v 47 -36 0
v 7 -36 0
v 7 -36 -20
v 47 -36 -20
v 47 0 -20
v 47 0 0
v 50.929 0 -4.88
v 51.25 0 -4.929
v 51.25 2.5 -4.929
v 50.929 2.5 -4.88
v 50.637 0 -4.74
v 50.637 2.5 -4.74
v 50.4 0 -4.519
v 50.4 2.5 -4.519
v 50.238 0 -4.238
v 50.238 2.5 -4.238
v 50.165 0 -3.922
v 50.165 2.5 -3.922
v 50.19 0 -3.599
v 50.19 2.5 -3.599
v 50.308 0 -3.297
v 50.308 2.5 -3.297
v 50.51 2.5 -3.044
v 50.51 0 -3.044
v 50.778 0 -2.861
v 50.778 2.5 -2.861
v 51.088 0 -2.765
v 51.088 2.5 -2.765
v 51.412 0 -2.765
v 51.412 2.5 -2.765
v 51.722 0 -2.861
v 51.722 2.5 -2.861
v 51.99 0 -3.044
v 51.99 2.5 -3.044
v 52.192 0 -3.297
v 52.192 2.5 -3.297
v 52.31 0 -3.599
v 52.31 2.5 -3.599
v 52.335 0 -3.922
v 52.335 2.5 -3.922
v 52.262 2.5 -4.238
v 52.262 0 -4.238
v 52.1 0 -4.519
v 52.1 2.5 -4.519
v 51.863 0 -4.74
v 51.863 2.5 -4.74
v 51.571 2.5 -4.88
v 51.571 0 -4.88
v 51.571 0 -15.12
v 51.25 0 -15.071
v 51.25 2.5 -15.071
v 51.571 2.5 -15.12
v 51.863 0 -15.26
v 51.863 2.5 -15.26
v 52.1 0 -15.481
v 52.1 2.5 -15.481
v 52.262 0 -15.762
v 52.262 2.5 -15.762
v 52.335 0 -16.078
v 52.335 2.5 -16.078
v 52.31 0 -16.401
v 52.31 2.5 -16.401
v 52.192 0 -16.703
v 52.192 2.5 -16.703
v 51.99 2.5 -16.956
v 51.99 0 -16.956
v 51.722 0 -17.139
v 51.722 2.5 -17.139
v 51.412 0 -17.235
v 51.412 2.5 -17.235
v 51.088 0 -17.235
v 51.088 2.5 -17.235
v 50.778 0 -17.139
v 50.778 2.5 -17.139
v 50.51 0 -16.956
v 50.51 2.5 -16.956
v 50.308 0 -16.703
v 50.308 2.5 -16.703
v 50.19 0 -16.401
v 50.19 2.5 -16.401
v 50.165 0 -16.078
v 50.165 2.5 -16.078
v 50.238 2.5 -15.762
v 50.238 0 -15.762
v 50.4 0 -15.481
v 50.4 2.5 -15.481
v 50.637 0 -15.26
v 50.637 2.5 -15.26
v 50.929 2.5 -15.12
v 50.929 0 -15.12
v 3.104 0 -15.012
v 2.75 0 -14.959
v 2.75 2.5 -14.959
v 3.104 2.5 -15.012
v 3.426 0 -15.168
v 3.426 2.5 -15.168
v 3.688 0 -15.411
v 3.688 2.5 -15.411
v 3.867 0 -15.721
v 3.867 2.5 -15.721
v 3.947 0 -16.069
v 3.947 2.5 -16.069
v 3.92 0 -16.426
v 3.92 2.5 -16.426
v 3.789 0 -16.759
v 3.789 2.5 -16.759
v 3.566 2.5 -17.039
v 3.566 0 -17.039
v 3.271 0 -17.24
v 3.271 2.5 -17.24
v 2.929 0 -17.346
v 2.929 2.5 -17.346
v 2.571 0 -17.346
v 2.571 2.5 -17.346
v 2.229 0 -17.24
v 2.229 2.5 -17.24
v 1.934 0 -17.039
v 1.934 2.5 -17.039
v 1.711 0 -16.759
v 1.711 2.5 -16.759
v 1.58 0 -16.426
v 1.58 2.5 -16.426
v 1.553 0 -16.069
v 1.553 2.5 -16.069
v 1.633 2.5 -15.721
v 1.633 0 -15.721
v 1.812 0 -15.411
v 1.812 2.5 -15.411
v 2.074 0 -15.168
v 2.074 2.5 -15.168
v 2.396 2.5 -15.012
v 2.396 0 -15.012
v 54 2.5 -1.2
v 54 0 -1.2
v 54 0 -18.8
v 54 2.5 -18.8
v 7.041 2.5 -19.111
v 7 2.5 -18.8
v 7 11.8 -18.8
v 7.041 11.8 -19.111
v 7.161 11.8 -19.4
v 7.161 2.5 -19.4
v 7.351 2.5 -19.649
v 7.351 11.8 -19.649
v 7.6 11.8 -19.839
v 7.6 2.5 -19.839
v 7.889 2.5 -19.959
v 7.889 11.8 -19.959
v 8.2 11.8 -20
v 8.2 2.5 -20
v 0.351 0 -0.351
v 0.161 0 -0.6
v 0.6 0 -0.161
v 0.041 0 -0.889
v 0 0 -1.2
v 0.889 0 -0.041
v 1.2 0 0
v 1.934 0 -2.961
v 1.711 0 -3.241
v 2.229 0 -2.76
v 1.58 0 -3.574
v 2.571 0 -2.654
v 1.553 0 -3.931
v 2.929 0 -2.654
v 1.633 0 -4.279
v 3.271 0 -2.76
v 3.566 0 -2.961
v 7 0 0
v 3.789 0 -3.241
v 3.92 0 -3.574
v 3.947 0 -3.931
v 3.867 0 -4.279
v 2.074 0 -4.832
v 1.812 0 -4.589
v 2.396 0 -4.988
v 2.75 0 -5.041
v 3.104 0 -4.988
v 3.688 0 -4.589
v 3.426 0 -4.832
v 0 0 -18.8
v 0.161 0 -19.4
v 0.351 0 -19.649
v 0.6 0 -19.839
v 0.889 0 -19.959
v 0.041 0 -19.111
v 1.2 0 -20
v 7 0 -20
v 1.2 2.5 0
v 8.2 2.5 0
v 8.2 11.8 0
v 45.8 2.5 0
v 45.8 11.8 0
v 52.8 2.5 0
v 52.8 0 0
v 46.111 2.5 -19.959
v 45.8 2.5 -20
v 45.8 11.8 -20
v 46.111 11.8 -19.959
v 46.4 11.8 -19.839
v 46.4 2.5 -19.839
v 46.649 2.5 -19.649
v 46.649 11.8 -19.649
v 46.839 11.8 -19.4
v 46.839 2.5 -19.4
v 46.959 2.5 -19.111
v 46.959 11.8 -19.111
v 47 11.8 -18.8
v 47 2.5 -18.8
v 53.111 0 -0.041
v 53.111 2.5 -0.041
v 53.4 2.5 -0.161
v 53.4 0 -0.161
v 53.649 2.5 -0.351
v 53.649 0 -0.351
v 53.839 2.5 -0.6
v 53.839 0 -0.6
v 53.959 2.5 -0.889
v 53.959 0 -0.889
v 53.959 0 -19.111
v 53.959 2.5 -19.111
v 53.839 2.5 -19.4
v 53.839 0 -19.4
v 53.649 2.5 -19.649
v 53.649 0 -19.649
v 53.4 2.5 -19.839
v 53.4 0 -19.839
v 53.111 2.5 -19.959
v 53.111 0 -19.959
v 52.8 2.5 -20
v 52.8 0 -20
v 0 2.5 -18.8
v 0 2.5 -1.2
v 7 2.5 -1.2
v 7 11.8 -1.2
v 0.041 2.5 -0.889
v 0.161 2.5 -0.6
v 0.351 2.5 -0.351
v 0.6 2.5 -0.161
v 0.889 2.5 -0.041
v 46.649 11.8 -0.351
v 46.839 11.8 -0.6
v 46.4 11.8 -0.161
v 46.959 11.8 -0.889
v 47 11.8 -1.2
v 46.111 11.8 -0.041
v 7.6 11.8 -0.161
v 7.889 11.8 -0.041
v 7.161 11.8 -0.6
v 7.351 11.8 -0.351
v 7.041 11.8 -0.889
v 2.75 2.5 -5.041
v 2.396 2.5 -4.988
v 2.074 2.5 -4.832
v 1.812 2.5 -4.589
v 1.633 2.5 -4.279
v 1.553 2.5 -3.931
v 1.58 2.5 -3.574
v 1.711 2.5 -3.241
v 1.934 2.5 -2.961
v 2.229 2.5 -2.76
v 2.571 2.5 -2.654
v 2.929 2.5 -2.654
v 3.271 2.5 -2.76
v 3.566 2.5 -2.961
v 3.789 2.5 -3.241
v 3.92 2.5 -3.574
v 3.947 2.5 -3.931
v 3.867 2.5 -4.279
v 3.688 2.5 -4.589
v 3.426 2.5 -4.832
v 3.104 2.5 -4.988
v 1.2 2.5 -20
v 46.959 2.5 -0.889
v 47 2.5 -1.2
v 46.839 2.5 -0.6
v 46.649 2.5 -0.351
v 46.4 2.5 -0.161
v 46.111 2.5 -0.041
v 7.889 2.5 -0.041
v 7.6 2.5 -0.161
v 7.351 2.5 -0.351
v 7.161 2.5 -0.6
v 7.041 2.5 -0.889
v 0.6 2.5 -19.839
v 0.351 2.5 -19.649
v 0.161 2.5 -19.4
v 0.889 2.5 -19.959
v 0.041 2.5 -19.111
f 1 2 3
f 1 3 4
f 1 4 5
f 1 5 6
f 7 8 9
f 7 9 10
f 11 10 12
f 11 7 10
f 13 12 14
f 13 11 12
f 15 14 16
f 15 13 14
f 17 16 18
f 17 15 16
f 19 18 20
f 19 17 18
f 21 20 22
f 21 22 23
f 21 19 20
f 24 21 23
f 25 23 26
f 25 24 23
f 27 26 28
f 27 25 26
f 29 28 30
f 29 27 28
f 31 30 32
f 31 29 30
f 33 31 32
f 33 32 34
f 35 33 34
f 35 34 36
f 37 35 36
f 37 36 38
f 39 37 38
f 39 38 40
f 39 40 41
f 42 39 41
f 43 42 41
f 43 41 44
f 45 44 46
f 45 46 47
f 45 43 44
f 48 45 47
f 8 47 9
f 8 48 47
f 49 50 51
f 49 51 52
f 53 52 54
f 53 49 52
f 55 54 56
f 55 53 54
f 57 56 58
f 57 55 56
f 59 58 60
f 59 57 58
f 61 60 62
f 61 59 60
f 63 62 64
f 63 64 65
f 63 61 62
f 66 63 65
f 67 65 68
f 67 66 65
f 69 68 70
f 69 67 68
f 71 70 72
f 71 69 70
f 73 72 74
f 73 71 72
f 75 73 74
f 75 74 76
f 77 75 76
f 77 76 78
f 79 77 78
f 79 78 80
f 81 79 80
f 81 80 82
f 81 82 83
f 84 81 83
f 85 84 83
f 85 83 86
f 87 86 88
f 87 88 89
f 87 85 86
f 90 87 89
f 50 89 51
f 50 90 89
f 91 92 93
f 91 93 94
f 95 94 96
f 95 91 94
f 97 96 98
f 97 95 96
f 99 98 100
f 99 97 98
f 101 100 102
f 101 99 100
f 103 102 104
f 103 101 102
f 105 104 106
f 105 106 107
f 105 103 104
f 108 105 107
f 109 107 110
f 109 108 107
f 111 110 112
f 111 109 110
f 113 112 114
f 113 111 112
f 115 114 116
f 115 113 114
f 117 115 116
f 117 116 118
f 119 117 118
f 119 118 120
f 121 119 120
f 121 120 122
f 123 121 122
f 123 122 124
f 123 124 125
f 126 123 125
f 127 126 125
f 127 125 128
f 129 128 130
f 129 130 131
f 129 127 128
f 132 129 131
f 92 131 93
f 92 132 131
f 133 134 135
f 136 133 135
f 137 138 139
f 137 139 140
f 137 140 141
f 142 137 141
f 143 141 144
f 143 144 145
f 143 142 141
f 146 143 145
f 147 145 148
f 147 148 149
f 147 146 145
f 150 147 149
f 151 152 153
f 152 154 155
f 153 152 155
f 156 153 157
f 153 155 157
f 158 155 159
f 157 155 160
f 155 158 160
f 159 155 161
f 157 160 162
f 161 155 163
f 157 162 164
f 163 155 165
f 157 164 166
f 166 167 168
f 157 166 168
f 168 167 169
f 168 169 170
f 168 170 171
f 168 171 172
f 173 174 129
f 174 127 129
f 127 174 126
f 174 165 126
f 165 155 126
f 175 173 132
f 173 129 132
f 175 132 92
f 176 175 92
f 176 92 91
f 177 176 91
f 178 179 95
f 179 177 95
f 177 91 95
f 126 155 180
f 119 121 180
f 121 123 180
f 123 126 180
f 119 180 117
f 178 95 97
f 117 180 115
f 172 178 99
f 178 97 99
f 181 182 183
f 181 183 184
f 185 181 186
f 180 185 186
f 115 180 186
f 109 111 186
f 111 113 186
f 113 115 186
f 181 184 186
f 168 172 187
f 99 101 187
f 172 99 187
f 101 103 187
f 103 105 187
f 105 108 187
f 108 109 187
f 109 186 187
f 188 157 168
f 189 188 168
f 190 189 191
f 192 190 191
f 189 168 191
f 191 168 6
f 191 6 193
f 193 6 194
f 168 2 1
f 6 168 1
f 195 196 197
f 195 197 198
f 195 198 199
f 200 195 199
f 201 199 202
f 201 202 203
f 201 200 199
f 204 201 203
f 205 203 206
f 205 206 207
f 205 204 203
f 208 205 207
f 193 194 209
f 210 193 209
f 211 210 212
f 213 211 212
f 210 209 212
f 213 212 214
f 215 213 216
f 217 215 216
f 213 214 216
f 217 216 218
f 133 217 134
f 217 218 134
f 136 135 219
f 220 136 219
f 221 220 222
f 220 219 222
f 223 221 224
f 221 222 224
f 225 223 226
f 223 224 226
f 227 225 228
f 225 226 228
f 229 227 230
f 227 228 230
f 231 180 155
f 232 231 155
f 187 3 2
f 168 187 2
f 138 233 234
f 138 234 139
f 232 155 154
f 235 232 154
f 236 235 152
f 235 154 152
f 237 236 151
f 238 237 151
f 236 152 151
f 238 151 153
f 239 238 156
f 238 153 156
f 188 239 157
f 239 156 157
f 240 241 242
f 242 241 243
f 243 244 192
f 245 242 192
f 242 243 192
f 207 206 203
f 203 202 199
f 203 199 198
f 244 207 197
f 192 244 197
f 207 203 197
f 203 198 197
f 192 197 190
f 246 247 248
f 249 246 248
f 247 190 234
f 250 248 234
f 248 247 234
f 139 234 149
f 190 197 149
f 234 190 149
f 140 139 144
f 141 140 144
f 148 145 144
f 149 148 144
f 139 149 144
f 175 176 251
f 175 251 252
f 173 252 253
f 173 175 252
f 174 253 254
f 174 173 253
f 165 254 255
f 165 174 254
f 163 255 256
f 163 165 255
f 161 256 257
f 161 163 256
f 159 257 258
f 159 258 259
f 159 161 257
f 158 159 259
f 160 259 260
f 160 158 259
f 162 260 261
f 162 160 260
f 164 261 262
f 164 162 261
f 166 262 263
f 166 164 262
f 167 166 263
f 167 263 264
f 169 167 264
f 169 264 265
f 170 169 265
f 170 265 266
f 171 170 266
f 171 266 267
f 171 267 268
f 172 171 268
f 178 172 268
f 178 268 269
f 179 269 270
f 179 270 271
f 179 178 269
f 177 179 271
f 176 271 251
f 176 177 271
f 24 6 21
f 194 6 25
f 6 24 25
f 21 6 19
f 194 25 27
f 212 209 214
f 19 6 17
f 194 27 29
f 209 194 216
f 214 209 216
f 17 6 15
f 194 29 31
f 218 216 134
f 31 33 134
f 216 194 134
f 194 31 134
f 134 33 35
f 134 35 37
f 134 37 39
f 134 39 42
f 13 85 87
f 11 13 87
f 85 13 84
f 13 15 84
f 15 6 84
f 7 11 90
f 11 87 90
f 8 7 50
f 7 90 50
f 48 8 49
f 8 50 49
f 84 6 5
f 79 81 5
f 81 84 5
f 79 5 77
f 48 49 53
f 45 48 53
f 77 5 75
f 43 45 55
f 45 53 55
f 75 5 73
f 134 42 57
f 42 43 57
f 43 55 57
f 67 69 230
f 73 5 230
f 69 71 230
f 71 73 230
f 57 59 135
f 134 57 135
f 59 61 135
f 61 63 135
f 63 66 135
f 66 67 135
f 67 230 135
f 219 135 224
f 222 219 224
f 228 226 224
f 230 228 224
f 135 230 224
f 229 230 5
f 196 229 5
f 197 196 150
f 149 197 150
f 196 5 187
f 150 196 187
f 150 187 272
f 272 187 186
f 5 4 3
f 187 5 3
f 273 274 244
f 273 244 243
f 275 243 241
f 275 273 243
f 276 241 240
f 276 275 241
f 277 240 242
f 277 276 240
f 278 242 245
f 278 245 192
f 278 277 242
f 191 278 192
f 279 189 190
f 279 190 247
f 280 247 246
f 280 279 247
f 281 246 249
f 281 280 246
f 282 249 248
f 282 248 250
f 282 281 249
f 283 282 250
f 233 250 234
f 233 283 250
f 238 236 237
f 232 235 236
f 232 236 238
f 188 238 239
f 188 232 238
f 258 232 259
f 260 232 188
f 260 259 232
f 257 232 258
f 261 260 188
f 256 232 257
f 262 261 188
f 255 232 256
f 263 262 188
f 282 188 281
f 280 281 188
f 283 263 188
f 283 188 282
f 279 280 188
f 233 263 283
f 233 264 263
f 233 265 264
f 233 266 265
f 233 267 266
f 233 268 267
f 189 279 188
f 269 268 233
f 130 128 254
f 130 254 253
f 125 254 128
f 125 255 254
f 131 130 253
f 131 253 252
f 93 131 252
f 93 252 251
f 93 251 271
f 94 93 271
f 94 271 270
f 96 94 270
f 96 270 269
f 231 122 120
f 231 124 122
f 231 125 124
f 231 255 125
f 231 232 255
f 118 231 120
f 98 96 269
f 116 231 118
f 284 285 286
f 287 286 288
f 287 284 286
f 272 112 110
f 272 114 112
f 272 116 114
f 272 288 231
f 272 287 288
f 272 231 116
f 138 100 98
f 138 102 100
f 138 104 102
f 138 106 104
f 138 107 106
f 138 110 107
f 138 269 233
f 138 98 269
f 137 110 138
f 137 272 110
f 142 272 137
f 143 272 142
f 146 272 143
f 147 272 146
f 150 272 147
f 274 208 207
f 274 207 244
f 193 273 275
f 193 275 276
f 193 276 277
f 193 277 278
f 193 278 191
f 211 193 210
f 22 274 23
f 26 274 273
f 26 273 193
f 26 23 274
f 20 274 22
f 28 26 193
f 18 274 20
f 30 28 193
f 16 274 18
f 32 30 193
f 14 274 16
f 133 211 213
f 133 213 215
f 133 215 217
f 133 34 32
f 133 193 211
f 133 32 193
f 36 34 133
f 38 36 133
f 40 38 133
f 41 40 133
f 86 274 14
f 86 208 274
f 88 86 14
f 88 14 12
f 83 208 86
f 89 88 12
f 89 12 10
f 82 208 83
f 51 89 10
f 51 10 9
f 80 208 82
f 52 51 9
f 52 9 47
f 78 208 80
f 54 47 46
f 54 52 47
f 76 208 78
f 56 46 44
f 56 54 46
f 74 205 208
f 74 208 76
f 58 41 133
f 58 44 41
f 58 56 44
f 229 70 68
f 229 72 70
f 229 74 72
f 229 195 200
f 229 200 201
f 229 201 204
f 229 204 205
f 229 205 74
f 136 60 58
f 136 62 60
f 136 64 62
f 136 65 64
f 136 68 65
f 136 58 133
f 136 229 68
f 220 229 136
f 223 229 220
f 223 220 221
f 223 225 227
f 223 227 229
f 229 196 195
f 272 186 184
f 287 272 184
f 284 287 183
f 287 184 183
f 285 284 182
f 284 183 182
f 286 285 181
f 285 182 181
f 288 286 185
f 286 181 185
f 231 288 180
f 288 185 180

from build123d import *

# Parameters (mm, degrees)
SKETCH1_R           = 1.200027231
SKETCH1_R_2         = 1.087684018
BOSS_EXTRUDE1_DEPTH = 2.5
BOSS_EXTRUDE2_DEPTH = 9.3
SKETCH3_W           = 40
SKETCH3_H           = 20
BOSS_EXTRUDE3_DEPTH = 36


with BuildPart() as part:
    # Sketch1 → Boss-Extrude1 (new body)
    with BuildSketch(Plane(origin=(0, 0, 0), x_dir=(1, 0, 0), z_dir=(0, 1, 0))):
        with BuildLine():
            Line((1.2, 0), (52.8, 0))
            ThreePointArc((52.8, 0), (53.648528137, 0.351471863), (54, 1.2))
            Line((54, 1.2), (54, 18.8))
            ThreePointArc((54, 18.8), (53.648528137, 19.648528137), (52.8, 20))
            Line((52.8, 20), (1.2, 20))
            ThreePointArc((1.2, 20), (0.351471863, 19.648528137), (0, 18.8))
            Line((0, 18.8), (0, 1.2))
            ThreePointArc((0, 1.2), (0.351471863, 0.351471863), (1.2, 0))
        make_face()
        with Locations(Location((2.75, 16.159014692, 0), (0, 0, 270))):
            Circle(SKETCH1_R, mode=Mode.SUBTRACT)
        with Locations(Location((51.25, 16.159014692, 0), (0, 0, 270))):
            Circle(SKETCH1_R_2, mode=Mode.SUBTRACT)
        with Locations(Location((51.25, 3.840985308, 0), (0, 0, 90))):
            Circle(SKETCH1_R_2, mode=Mode.SUBTRACT)
        with Locations(Location((2.75, 3.840985308, 0), (0, 0, 90))):
            Circle(SKETCH1_R, mode=Mode.SUBTRACT)
    extrude(amount=BOSS_EXTRUDE1_DEPTH)

    # Sketch2 → Boss-Extrude2 (add)
    with BuildSketch(Plane(origin=(0, 2.5, 0), x_dir=(1, 0, 0), z_dir=(0, 1, 0))):
        with BuildLine():
            Line((8.2, 20), (45.8, 20))
            ThreePointArc((45.8, 20), (46.648528137, 19.648528137), (47, 18.8))
            Line((47, 18.8), (47, 1.2))
            ThreePointArc((47, 1.2), (46.648528137, 0.351471863), (45.8, 0))
            Line((45.8, 0), (8.2, 0))
            ThreePointArc((8.2, 0), (7.351471863, 0.351471863), (7, 1.2))
            Line((7, 1.2), (7, 18.8))
            ThreePointArc((7, 18.8), (7.351471863, 19.648528137), (8.2, 20))
        make_face()
    extrude(amount=BOSS_EXTRUDE2_DEPTH)

    # Sketch3 → Boss-Extrude3 (add)
    with BuildSketch(Plane.XZ):
        with Locations((27, -10)):
            Rectangle(SKETCH3_W, SKETCH3_H)
    extrude(amount=BOSS_EXTRUDE3_DEPTH)


solid = part.part
